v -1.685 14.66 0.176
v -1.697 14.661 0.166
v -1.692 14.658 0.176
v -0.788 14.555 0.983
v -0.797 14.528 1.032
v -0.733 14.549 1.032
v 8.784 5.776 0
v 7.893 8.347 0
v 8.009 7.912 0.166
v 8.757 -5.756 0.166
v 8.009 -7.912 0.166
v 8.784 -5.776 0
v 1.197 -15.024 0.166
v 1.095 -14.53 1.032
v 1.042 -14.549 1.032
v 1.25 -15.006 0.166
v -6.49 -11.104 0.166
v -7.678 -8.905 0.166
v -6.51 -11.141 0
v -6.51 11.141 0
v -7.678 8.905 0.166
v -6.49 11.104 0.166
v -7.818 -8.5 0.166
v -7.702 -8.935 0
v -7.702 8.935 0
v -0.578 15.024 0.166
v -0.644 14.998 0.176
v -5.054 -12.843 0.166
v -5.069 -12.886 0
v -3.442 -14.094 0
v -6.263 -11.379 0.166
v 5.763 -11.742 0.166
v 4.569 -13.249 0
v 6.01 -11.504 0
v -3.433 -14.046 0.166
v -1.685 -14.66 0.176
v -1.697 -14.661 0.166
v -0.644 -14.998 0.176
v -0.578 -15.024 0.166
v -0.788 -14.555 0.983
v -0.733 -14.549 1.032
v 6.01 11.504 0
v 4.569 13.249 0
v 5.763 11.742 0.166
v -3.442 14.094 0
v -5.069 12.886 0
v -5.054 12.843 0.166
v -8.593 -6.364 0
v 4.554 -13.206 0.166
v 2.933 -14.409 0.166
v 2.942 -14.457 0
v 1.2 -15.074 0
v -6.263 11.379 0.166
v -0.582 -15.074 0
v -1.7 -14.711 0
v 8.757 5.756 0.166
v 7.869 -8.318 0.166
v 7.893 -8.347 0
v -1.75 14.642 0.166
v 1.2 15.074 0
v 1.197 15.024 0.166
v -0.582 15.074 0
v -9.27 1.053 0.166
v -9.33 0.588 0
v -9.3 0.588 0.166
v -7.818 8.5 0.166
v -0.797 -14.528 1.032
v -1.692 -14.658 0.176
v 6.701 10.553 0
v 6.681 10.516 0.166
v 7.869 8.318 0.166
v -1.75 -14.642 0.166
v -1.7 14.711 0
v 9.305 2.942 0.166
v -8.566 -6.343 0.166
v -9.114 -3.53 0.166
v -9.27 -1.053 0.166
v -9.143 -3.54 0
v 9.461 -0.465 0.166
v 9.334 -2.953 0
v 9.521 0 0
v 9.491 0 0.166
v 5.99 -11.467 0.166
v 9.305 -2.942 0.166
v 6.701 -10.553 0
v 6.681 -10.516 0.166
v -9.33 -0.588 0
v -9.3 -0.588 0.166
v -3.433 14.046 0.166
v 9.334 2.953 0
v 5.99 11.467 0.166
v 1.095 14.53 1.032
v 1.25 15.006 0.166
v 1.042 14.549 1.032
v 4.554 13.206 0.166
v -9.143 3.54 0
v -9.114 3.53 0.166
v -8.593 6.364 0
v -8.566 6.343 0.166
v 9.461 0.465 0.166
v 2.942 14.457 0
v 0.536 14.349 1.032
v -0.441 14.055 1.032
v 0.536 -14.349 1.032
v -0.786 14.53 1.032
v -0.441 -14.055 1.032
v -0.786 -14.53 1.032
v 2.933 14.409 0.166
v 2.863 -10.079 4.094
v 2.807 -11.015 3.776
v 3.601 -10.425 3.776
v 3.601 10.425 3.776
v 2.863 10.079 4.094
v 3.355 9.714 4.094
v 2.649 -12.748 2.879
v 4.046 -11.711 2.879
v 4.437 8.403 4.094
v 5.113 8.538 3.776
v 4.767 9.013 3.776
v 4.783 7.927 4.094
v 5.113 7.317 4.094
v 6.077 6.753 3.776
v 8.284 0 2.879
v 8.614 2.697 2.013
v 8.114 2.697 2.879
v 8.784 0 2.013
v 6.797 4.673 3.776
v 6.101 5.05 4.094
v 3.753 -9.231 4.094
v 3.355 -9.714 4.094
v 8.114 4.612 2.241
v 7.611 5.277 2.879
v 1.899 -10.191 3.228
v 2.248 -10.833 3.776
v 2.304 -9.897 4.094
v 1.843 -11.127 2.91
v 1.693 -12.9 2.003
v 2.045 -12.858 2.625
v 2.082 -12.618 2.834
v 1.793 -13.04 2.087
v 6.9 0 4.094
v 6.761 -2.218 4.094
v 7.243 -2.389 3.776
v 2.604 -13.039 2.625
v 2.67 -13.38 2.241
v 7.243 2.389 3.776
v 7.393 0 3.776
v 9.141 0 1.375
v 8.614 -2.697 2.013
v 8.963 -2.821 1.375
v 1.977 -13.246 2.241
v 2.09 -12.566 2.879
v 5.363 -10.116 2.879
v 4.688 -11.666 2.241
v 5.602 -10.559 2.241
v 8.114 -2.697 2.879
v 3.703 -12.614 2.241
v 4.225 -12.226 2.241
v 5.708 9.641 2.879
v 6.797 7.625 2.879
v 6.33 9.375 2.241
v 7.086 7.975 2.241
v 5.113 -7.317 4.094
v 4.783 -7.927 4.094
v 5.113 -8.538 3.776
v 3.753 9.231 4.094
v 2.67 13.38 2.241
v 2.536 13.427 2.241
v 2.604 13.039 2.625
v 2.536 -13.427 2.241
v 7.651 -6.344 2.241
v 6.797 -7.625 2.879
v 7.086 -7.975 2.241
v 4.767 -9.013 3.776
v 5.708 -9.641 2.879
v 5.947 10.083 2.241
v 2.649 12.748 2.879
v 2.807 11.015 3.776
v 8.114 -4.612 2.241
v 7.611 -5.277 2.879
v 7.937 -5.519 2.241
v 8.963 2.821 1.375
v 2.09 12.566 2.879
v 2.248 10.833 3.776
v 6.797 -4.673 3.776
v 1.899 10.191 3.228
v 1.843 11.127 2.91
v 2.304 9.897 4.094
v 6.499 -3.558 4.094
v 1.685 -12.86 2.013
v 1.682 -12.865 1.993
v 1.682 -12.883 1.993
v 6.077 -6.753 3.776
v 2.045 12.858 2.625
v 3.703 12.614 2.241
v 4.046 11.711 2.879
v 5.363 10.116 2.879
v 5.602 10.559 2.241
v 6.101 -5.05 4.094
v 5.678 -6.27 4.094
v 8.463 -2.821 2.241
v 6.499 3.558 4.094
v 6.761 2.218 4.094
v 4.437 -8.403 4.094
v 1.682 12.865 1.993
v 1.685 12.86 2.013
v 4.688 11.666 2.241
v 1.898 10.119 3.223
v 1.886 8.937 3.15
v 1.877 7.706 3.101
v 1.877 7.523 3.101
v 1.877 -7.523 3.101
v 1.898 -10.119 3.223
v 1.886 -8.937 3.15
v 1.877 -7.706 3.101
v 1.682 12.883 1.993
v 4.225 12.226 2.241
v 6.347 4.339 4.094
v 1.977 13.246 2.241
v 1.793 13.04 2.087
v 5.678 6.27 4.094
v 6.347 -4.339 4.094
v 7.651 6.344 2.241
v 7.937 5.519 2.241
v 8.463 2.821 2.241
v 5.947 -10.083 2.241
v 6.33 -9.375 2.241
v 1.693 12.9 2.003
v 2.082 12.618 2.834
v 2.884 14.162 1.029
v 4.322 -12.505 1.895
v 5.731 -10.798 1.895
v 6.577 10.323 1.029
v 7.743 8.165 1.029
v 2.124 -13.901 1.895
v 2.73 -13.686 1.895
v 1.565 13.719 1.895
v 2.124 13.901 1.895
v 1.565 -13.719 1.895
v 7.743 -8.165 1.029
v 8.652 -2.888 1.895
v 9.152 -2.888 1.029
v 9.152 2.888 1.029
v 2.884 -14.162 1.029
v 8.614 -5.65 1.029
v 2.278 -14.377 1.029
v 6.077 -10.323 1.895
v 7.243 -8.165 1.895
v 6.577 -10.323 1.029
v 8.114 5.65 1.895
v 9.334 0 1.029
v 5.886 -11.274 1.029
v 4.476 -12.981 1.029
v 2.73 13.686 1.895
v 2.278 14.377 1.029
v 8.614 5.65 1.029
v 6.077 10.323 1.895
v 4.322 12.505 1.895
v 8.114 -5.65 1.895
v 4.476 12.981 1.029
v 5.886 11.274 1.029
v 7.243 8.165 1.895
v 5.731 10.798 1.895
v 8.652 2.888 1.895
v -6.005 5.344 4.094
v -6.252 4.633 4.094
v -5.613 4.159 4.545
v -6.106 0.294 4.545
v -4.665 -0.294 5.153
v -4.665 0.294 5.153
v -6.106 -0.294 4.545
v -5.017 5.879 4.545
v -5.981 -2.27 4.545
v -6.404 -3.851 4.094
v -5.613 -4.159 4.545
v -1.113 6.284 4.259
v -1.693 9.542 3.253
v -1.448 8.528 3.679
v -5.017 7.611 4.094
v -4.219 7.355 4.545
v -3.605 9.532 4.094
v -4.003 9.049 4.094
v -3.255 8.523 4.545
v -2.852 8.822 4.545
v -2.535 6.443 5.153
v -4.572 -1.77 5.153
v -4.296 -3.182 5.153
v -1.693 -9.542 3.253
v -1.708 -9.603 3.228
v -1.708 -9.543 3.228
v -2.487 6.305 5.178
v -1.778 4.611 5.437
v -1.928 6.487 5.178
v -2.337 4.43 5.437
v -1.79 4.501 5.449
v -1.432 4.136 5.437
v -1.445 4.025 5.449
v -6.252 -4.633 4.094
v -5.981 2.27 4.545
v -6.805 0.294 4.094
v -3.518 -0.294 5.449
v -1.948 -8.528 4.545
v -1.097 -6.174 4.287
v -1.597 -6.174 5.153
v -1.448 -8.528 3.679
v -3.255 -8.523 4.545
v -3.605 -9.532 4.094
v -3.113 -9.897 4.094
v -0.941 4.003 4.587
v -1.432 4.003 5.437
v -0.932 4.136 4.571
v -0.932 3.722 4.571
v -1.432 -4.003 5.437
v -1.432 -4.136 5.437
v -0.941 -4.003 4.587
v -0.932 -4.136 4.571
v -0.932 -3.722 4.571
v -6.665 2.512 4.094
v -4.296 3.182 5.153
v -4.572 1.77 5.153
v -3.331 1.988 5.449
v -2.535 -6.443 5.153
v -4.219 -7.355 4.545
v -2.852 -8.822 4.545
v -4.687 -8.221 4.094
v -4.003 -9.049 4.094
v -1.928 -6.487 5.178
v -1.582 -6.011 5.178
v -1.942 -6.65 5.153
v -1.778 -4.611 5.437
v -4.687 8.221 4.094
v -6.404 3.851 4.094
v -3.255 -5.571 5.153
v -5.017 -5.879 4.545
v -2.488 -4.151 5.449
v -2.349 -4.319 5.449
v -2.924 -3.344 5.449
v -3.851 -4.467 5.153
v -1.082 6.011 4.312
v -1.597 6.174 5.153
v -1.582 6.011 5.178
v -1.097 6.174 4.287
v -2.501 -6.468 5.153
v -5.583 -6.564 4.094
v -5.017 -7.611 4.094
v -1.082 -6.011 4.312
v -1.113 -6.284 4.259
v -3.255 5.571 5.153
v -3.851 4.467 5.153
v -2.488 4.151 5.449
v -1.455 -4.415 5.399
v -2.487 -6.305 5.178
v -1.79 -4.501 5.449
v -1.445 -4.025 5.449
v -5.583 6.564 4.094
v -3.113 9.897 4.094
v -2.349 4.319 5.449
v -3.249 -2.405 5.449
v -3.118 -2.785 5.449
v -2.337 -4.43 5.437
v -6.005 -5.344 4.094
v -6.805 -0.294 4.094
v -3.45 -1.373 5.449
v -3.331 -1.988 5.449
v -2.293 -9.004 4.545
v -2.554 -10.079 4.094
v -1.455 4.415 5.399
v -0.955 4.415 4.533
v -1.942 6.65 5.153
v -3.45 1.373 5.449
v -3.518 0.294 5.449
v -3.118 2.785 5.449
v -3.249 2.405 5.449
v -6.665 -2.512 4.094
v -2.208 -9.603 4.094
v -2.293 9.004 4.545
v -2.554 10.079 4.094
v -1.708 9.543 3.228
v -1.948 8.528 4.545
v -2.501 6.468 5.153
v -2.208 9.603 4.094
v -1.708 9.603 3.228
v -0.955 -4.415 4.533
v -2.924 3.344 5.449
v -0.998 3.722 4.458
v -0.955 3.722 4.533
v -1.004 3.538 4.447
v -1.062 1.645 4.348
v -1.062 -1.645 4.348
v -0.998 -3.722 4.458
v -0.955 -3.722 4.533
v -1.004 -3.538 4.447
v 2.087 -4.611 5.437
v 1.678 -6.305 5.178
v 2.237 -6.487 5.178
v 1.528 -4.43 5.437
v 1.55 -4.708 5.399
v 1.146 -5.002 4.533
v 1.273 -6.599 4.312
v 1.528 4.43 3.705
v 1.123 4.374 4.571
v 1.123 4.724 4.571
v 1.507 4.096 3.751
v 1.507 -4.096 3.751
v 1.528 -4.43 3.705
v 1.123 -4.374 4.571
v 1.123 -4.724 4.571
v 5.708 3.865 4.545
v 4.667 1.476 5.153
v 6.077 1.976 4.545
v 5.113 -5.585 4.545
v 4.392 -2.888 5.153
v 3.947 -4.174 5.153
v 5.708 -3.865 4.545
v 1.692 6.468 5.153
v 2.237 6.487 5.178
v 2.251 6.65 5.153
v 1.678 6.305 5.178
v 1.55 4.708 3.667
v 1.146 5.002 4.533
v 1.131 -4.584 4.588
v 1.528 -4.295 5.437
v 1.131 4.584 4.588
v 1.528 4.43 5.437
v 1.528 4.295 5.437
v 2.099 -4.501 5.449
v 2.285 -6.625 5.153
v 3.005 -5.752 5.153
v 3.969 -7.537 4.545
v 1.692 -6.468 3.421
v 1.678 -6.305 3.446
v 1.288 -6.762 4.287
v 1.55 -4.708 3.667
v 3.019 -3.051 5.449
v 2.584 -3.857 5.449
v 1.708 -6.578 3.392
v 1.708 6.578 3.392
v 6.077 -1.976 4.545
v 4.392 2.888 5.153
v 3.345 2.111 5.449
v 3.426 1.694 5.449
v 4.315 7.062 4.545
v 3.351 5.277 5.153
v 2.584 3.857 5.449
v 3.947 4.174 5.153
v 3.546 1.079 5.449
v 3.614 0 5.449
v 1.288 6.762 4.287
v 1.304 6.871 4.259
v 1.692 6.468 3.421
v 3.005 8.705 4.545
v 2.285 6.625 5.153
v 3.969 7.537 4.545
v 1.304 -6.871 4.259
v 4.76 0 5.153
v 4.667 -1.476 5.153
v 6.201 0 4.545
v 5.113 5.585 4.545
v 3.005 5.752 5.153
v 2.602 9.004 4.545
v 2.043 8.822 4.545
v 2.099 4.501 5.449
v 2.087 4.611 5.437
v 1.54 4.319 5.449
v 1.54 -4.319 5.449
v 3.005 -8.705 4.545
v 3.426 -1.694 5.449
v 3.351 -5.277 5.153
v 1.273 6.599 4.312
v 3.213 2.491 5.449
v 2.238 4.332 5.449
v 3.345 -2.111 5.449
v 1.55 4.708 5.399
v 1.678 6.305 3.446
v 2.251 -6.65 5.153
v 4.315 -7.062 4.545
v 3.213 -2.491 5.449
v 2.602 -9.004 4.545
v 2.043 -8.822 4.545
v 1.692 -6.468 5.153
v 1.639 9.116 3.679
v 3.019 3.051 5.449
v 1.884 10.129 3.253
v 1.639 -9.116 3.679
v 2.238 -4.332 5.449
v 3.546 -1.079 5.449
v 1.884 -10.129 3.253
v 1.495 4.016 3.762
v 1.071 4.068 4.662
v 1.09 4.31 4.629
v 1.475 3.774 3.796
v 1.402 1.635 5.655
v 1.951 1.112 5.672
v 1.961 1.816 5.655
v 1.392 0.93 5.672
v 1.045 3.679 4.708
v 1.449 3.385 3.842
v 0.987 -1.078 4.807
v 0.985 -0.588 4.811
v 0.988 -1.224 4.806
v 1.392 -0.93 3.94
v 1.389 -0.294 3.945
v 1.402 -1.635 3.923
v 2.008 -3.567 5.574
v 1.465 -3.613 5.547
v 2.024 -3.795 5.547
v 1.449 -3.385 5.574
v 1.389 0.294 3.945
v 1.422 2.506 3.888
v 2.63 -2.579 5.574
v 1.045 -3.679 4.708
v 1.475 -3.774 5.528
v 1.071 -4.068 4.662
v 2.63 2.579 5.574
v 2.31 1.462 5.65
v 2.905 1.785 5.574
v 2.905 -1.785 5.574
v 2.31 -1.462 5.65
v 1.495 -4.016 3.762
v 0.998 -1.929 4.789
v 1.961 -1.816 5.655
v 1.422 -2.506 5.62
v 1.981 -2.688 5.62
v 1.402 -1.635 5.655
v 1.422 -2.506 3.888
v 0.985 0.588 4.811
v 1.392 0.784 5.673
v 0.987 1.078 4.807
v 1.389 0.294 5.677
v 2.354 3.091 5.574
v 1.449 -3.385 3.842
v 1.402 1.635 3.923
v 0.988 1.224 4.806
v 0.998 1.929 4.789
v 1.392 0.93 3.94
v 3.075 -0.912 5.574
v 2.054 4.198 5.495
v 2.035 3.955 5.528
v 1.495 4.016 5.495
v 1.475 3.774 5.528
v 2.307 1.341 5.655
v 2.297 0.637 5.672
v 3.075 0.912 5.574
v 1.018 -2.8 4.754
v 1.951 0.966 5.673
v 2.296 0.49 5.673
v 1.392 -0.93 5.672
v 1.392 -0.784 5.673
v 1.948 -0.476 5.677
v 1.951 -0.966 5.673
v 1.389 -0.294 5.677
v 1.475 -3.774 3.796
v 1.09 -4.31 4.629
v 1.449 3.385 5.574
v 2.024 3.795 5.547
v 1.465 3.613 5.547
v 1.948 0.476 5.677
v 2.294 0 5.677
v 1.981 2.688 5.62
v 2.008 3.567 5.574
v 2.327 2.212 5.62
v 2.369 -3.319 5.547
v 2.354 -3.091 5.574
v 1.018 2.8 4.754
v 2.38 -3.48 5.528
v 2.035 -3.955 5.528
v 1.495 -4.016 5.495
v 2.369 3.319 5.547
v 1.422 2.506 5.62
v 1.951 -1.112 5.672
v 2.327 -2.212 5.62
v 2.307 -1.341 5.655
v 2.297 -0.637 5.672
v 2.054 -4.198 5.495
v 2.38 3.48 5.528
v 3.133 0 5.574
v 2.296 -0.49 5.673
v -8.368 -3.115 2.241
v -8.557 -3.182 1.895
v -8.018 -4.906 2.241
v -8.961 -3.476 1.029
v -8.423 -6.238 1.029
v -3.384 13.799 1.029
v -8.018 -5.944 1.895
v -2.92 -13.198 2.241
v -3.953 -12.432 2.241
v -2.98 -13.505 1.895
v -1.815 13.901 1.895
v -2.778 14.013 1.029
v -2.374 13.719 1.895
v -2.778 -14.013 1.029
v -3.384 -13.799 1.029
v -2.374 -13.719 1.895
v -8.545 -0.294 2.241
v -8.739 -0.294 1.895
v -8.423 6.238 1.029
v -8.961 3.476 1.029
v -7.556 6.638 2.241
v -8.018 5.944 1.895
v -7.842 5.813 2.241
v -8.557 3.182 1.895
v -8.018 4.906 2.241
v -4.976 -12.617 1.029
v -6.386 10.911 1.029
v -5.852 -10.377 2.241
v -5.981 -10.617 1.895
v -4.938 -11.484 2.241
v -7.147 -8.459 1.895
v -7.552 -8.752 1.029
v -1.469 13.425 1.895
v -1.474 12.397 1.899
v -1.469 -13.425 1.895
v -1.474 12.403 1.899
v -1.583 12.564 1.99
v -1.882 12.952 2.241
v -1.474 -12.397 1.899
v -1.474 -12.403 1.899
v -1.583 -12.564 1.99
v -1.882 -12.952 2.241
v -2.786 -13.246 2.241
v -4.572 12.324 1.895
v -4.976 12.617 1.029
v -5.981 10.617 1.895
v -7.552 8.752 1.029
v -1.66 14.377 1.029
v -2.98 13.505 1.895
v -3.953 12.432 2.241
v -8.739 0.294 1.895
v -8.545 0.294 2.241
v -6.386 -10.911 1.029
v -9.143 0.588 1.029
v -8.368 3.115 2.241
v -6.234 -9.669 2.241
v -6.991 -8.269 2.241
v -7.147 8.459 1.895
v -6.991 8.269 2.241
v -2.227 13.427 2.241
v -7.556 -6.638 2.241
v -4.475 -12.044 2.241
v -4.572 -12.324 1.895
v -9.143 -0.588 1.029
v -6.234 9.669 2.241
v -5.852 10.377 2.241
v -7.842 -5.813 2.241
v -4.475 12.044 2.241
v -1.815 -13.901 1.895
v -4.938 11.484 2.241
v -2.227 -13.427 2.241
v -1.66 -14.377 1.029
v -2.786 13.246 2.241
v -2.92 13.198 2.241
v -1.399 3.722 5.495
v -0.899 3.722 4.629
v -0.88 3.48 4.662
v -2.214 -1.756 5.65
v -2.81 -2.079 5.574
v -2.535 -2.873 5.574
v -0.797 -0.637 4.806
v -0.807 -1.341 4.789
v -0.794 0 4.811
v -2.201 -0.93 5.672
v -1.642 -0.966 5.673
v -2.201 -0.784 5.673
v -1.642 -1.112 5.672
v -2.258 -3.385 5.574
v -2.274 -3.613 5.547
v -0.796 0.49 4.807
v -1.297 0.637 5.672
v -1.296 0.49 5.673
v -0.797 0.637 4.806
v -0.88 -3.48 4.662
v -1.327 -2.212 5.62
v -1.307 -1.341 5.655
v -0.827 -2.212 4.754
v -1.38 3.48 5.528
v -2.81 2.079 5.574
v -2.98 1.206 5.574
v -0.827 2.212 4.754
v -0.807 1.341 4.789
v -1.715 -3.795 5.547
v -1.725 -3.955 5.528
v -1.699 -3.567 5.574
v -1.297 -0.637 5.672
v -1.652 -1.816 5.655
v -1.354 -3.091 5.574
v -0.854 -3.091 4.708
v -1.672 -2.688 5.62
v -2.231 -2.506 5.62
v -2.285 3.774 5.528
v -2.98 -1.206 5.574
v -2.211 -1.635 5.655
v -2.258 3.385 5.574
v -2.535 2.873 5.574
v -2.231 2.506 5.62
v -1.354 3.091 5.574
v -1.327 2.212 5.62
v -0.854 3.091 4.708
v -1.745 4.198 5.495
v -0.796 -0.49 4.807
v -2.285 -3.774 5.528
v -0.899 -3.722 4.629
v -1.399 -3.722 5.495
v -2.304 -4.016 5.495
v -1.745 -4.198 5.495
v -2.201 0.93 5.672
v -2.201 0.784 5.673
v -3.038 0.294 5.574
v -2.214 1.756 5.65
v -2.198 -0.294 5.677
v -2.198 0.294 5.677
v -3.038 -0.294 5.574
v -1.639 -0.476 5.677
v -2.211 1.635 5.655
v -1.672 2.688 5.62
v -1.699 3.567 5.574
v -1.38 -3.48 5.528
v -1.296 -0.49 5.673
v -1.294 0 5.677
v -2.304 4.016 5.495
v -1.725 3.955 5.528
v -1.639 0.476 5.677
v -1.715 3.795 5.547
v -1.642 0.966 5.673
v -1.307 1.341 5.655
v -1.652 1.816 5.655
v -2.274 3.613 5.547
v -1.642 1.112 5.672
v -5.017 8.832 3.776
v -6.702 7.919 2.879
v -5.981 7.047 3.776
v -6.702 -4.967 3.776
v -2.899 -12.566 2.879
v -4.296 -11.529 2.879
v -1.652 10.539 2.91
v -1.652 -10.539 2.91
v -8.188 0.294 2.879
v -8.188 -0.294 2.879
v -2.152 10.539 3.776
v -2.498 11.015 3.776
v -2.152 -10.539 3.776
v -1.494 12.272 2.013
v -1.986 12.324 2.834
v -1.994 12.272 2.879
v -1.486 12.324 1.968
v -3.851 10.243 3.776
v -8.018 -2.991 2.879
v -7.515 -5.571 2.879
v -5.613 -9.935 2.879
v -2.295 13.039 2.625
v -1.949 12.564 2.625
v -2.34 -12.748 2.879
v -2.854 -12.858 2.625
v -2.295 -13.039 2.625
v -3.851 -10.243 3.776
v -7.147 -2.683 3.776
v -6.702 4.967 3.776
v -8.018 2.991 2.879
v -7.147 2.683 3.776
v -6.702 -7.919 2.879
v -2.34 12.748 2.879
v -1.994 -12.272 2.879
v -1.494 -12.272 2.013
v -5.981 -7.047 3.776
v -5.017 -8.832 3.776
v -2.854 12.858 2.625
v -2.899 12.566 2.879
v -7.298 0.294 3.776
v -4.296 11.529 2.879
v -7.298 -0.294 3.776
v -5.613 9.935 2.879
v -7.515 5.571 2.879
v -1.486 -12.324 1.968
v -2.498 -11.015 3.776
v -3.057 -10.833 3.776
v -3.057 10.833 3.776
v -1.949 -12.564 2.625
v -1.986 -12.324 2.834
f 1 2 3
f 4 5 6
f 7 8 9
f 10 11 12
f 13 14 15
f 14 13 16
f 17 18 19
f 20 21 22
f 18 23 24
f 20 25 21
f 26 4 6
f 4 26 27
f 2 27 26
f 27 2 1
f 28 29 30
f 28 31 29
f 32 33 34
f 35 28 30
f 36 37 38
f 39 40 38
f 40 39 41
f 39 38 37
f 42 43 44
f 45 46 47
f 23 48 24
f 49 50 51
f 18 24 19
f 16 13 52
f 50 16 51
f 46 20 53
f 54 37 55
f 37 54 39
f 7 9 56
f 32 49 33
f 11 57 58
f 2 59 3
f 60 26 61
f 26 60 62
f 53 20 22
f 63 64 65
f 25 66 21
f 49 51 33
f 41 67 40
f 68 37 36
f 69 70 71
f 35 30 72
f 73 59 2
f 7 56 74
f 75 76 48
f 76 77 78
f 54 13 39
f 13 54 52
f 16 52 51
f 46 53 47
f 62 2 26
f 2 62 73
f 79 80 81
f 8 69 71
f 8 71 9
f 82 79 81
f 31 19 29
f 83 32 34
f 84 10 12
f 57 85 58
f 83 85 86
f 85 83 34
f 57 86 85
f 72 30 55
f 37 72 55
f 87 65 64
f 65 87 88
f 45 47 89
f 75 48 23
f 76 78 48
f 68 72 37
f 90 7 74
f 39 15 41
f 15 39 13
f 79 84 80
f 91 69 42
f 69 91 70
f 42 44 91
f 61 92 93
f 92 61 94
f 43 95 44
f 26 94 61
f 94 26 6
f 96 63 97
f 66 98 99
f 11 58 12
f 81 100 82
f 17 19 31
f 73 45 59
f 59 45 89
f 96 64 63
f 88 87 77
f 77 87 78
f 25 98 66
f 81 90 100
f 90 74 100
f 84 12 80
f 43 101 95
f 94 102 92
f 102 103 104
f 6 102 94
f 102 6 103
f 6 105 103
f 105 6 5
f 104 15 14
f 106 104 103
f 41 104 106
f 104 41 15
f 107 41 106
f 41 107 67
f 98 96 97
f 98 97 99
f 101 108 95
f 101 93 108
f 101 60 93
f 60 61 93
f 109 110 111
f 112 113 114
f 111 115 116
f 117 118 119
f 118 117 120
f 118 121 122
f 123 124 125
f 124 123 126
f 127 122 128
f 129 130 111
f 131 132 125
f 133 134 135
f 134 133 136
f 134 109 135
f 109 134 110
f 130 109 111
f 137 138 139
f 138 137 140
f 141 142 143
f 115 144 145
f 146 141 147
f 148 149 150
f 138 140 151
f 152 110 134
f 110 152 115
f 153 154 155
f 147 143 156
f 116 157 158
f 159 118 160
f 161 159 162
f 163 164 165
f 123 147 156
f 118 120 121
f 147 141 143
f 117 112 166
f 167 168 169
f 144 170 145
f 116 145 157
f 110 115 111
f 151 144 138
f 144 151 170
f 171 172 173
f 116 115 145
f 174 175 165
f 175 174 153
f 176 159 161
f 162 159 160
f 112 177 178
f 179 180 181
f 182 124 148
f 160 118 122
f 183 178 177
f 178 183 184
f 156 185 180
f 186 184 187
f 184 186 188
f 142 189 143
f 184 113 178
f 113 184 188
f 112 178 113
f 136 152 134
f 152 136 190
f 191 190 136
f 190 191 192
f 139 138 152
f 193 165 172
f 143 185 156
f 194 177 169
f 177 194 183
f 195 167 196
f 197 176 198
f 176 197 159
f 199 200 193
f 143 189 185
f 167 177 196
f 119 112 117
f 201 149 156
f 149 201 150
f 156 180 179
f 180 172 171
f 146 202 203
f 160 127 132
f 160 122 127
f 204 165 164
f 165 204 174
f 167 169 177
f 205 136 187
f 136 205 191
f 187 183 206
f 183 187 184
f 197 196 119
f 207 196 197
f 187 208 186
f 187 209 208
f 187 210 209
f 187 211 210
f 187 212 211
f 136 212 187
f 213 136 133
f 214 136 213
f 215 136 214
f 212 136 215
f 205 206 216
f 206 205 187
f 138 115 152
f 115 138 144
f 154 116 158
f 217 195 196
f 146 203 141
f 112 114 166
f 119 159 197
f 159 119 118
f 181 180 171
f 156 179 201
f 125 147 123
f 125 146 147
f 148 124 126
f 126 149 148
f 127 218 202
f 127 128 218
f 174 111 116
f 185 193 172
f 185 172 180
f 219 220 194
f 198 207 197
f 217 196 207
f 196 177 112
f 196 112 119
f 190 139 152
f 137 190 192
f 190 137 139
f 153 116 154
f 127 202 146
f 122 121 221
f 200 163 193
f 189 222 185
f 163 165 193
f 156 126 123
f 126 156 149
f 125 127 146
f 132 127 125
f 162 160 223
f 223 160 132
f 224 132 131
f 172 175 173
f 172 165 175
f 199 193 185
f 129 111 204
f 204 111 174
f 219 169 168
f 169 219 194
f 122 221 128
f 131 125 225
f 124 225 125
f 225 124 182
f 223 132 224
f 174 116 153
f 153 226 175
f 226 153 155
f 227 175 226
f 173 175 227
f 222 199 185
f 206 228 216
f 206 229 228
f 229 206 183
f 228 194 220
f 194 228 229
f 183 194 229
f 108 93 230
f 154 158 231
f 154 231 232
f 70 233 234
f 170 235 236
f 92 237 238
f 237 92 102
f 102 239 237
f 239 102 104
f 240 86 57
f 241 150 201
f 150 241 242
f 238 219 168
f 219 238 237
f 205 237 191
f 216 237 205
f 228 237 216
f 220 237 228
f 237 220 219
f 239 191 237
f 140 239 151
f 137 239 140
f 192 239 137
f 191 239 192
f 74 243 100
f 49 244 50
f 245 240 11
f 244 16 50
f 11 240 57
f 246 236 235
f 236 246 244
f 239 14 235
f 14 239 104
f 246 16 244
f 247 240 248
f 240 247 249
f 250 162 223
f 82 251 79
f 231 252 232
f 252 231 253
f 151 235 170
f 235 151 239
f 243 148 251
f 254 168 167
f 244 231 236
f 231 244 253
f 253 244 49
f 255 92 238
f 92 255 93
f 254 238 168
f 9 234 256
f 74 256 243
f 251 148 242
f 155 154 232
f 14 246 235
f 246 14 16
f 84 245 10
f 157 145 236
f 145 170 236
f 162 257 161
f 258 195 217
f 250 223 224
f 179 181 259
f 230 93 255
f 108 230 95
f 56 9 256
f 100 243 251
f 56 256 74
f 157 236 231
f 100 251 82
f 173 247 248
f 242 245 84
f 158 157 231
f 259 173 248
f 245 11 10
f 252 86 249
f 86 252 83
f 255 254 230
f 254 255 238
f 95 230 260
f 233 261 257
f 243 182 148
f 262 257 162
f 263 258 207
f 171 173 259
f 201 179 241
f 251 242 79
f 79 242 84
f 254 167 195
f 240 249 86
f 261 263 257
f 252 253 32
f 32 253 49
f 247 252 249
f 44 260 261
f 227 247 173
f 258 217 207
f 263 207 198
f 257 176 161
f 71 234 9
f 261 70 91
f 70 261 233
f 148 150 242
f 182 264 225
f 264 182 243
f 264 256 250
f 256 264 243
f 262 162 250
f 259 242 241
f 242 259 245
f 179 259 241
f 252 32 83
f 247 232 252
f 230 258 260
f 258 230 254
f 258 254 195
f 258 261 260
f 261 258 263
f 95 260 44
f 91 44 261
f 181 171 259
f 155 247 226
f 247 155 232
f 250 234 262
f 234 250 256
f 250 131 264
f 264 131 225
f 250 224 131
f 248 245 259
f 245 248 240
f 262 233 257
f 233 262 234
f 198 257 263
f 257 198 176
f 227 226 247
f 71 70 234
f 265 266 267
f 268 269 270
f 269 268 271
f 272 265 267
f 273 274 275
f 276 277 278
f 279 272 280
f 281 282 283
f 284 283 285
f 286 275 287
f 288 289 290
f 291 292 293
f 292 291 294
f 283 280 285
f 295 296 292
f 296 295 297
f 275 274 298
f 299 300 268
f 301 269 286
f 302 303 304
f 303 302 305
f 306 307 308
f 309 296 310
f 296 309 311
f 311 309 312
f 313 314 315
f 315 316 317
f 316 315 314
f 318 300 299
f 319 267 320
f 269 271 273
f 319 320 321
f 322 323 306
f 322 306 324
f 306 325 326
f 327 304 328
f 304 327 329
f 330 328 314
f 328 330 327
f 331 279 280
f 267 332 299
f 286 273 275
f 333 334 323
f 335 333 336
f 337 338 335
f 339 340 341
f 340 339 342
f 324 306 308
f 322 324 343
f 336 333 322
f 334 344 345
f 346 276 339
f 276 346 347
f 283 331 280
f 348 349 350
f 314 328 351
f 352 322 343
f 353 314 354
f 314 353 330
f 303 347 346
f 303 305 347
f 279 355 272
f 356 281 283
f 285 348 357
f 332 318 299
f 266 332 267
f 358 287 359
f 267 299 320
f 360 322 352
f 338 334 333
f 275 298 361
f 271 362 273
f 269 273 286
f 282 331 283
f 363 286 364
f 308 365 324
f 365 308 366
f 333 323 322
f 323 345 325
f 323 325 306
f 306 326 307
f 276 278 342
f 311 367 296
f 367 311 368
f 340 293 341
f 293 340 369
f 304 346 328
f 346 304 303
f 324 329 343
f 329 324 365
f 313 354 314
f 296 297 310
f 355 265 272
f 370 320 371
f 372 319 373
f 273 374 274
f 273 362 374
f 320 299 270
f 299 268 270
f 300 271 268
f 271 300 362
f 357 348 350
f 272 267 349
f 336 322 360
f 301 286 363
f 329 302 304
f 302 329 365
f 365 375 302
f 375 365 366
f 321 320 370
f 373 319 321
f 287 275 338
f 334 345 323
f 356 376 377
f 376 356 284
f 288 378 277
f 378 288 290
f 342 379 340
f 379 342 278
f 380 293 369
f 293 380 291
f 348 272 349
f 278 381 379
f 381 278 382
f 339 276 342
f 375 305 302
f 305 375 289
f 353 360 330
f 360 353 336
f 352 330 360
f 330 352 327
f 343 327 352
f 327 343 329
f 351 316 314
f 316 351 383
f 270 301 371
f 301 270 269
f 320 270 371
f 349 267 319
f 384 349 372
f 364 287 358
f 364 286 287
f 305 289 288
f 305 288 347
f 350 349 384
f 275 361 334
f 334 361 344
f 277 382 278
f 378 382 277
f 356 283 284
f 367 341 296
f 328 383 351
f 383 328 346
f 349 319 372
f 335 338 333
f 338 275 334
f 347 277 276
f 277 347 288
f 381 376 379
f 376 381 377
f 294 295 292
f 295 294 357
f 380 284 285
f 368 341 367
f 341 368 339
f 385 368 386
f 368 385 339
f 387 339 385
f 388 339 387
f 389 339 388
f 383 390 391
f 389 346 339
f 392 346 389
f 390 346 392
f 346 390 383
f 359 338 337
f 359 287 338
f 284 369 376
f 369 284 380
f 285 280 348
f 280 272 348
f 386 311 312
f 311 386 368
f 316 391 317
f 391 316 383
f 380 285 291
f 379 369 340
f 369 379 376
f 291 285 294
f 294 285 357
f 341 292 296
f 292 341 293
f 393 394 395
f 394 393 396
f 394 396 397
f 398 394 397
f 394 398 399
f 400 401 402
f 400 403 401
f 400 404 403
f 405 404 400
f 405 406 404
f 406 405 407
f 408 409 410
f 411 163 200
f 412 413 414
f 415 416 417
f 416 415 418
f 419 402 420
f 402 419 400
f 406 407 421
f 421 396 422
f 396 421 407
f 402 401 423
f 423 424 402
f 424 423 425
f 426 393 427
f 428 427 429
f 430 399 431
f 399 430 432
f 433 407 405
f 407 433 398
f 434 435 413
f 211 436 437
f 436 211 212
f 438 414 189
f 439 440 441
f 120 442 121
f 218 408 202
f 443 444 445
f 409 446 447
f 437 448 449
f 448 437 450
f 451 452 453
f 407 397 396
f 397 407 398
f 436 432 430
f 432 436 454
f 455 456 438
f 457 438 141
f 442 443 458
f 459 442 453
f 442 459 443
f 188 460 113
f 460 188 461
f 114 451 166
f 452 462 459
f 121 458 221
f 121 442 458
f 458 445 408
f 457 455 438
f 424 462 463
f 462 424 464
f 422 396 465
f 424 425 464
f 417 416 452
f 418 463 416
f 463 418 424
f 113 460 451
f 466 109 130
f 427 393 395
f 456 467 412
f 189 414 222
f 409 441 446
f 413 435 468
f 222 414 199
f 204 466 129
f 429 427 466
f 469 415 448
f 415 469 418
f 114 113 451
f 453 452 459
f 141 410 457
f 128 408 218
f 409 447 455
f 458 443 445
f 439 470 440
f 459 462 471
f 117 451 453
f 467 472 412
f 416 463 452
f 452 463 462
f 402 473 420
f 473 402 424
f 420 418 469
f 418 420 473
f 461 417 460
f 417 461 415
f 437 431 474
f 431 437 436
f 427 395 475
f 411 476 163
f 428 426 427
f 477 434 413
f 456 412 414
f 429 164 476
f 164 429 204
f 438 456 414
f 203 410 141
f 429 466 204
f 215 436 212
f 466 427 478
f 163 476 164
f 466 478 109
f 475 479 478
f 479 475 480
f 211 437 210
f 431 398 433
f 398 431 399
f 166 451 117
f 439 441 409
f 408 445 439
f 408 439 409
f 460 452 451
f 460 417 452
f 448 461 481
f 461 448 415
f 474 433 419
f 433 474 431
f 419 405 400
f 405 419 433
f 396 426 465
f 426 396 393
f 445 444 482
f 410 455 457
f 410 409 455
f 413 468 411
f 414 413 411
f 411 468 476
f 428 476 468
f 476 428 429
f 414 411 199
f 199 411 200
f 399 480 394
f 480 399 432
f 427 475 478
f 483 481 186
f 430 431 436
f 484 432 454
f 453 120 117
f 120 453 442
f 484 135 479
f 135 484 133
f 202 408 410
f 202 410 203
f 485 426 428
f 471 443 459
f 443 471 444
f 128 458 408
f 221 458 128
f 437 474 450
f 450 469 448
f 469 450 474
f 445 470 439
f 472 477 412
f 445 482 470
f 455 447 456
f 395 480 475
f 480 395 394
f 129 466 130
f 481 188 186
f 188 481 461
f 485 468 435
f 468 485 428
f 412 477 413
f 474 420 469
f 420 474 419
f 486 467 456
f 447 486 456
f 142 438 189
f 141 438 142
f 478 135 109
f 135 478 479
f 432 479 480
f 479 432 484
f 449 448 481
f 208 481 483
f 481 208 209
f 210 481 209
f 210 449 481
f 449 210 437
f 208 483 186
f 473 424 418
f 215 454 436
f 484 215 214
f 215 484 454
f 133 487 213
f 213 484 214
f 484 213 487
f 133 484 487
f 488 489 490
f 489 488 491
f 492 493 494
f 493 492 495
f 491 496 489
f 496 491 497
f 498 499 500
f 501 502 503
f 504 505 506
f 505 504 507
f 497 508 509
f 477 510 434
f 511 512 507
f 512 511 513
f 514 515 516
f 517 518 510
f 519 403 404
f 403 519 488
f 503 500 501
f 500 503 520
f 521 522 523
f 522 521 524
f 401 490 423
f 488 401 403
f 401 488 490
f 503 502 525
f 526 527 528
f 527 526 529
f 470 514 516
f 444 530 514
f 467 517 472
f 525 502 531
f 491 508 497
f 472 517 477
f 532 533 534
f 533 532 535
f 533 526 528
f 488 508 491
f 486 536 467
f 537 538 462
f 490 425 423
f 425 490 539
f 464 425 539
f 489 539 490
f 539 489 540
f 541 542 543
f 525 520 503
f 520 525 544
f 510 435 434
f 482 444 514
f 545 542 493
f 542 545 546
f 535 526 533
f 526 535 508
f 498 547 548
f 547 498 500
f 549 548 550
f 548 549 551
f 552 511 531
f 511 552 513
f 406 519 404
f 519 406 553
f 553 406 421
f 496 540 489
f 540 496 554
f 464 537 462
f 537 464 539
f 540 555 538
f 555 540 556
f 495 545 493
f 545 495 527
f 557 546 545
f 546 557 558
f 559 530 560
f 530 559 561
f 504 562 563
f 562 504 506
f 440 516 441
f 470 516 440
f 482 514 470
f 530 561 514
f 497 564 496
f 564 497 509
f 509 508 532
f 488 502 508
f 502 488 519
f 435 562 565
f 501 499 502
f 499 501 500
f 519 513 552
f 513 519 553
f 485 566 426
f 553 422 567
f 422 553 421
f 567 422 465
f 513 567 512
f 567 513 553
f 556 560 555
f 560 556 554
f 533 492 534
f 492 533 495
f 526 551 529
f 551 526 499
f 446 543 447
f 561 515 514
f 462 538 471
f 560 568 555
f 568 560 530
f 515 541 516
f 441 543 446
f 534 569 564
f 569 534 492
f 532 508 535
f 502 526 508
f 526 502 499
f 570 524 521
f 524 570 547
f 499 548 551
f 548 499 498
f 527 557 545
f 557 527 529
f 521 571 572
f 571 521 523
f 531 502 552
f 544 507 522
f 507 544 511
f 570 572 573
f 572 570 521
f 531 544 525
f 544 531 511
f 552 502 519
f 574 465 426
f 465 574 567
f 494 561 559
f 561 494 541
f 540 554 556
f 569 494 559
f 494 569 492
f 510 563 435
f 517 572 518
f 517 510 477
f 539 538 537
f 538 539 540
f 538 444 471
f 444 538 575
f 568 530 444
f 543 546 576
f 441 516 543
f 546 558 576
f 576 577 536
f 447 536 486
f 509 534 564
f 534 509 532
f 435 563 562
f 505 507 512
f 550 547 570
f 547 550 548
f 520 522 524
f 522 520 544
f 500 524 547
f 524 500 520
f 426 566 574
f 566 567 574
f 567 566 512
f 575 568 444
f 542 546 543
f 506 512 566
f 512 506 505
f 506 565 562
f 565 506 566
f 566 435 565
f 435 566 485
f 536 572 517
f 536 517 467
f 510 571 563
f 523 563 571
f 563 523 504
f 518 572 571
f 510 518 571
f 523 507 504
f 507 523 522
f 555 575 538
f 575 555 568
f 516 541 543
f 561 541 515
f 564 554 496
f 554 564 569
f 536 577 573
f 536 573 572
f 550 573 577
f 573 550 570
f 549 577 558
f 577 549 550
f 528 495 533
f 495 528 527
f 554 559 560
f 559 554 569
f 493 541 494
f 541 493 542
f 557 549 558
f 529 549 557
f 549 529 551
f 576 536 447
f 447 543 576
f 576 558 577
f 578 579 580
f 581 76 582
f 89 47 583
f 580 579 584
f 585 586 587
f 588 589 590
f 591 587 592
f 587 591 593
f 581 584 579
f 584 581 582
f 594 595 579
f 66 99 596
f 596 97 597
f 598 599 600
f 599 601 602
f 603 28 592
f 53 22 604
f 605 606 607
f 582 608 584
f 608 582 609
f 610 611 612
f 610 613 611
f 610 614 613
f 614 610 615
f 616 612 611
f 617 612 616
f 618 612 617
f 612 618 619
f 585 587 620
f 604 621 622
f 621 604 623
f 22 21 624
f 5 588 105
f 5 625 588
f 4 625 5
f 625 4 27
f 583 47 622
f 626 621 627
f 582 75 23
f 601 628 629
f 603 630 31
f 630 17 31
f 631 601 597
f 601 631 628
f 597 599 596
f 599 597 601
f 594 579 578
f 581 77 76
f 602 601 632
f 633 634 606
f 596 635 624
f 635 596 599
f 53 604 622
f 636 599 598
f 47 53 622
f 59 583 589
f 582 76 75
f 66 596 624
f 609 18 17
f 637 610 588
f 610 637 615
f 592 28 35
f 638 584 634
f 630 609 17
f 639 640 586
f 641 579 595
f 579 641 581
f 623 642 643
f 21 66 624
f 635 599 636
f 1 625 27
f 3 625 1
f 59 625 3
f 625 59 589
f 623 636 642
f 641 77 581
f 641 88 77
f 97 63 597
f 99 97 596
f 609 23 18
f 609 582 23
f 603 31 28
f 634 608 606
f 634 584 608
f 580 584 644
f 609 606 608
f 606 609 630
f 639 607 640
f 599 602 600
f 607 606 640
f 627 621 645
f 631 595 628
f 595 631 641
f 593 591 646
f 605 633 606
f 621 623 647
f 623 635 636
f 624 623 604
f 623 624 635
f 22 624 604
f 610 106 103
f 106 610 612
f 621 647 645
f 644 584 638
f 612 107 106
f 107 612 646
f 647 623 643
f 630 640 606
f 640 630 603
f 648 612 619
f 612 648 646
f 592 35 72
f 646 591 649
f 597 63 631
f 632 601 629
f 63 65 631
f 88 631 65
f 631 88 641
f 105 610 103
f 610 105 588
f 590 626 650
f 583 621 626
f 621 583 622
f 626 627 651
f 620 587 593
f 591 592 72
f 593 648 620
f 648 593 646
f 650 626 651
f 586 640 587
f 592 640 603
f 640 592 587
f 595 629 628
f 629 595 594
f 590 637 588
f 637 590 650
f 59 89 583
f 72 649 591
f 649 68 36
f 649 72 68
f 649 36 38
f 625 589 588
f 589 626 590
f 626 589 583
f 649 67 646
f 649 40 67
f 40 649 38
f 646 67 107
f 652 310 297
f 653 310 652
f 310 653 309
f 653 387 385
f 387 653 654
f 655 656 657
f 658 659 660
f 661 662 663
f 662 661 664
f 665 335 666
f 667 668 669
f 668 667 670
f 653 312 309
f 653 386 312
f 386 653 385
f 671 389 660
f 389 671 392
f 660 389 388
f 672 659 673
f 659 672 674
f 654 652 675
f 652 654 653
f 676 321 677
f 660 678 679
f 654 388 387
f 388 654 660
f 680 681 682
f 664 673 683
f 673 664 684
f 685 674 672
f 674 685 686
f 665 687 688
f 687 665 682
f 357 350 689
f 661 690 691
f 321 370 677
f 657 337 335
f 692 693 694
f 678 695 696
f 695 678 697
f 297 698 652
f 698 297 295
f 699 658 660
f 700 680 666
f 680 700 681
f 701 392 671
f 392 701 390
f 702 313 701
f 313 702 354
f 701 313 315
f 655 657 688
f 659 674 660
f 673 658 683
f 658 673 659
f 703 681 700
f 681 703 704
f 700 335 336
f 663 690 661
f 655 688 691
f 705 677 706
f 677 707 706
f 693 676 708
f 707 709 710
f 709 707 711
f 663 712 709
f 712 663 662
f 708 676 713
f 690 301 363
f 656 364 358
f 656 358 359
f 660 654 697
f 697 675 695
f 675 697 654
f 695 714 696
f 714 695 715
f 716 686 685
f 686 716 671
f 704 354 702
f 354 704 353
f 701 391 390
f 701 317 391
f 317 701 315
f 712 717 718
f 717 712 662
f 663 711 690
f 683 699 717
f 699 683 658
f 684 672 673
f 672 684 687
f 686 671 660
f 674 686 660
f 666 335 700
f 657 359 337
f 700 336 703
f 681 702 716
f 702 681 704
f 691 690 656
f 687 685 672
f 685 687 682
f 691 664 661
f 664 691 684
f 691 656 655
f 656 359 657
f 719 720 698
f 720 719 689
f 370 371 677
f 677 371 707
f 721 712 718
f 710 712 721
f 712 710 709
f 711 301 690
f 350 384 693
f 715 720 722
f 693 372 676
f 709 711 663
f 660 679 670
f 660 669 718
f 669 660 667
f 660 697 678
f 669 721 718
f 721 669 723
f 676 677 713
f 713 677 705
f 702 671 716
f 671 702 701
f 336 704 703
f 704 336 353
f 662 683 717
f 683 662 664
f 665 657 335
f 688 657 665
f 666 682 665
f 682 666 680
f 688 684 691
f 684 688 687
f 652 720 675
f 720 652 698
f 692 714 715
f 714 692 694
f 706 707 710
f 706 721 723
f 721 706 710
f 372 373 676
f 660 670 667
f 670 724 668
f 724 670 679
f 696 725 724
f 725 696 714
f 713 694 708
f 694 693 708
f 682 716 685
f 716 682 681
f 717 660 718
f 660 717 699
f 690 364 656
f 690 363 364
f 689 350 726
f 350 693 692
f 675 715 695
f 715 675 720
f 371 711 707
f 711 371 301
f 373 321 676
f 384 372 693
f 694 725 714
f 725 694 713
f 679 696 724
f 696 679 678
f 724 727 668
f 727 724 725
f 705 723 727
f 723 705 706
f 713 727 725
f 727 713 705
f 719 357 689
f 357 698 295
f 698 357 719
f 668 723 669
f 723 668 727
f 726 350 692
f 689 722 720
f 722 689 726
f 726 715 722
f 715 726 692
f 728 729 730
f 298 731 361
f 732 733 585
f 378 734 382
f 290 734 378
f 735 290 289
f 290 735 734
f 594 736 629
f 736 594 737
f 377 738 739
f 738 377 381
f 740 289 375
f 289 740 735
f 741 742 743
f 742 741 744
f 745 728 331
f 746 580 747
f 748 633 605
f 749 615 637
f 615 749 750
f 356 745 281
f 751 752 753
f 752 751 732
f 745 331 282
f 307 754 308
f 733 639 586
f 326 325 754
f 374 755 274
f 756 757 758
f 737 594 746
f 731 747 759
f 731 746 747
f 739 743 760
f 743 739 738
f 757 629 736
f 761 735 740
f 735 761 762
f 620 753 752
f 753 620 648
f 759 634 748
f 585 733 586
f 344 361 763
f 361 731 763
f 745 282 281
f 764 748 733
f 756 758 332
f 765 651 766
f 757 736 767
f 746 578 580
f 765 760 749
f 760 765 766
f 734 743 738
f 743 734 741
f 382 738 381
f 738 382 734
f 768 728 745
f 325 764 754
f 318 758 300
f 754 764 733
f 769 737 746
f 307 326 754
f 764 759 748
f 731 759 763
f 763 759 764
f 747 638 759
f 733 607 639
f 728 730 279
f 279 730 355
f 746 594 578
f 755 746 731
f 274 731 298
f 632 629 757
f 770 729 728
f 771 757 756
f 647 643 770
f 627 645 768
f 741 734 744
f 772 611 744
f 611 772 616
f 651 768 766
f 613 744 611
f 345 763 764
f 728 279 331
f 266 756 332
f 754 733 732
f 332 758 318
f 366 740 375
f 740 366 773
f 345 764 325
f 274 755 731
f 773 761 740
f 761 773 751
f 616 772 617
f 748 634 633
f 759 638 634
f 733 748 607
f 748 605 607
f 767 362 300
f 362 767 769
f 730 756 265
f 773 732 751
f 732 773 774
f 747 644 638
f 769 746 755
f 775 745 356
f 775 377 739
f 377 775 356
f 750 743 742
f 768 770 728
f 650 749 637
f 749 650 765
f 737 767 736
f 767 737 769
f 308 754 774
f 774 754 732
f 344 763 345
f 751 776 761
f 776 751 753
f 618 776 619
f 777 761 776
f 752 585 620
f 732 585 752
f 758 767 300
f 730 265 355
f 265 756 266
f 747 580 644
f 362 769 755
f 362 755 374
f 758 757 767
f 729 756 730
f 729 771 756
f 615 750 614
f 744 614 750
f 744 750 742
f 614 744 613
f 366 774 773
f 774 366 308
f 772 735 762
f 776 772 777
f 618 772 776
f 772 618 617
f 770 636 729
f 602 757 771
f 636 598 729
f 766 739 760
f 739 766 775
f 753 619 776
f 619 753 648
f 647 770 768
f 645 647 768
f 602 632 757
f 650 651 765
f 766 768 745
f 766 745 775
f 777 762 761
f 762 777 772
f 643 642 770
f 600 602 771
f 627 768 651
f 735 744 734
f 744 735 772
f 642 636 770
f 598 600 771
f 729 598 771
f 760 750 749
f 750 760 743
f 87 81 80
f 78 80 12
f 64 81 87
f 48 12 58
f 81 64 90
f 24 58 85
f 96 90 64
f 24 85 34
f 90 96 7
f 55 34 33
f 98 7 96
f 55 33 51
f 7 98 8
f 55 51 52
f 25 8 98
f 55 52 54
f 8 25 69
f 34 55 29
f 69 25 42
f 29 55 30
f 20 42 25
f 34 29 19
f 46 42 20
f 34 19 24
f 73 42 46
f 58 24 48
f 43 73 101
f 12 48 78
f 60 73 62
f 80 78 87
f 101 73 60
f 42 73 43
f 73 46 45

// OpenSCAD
// length to width (<1 stretches along cable)
aspectratio=0.6; // [0.3:.1:2]
// diameter of cable (with some extra room)
holesize=5.5; // [2.5:1:10.5]
// radius of smoothing sphere
sharpness=1; // [0:0.1:1]

intersection(){
    scale([2*sqrt(aspectratio),2/sqrt(aspectratio),1])cylinder(r=holesize+2,h=holesize*2);
    minkowski(){
        difference(){
            scale([sqrt(aspectratio),1/sqrt(aspectratio),0.45])sphere(r=holesize*2);
            translate([0,0,holesize/2])rotate([90,270,0]){
                cylinder(d=holesize, h=100, center=true);
                translate([holesize/3,0,0])rotate([0,0,45])cube([holesize/2,holesize/2,100],center=true);}
        }
    sphere(r=sharpness);}
}
    
